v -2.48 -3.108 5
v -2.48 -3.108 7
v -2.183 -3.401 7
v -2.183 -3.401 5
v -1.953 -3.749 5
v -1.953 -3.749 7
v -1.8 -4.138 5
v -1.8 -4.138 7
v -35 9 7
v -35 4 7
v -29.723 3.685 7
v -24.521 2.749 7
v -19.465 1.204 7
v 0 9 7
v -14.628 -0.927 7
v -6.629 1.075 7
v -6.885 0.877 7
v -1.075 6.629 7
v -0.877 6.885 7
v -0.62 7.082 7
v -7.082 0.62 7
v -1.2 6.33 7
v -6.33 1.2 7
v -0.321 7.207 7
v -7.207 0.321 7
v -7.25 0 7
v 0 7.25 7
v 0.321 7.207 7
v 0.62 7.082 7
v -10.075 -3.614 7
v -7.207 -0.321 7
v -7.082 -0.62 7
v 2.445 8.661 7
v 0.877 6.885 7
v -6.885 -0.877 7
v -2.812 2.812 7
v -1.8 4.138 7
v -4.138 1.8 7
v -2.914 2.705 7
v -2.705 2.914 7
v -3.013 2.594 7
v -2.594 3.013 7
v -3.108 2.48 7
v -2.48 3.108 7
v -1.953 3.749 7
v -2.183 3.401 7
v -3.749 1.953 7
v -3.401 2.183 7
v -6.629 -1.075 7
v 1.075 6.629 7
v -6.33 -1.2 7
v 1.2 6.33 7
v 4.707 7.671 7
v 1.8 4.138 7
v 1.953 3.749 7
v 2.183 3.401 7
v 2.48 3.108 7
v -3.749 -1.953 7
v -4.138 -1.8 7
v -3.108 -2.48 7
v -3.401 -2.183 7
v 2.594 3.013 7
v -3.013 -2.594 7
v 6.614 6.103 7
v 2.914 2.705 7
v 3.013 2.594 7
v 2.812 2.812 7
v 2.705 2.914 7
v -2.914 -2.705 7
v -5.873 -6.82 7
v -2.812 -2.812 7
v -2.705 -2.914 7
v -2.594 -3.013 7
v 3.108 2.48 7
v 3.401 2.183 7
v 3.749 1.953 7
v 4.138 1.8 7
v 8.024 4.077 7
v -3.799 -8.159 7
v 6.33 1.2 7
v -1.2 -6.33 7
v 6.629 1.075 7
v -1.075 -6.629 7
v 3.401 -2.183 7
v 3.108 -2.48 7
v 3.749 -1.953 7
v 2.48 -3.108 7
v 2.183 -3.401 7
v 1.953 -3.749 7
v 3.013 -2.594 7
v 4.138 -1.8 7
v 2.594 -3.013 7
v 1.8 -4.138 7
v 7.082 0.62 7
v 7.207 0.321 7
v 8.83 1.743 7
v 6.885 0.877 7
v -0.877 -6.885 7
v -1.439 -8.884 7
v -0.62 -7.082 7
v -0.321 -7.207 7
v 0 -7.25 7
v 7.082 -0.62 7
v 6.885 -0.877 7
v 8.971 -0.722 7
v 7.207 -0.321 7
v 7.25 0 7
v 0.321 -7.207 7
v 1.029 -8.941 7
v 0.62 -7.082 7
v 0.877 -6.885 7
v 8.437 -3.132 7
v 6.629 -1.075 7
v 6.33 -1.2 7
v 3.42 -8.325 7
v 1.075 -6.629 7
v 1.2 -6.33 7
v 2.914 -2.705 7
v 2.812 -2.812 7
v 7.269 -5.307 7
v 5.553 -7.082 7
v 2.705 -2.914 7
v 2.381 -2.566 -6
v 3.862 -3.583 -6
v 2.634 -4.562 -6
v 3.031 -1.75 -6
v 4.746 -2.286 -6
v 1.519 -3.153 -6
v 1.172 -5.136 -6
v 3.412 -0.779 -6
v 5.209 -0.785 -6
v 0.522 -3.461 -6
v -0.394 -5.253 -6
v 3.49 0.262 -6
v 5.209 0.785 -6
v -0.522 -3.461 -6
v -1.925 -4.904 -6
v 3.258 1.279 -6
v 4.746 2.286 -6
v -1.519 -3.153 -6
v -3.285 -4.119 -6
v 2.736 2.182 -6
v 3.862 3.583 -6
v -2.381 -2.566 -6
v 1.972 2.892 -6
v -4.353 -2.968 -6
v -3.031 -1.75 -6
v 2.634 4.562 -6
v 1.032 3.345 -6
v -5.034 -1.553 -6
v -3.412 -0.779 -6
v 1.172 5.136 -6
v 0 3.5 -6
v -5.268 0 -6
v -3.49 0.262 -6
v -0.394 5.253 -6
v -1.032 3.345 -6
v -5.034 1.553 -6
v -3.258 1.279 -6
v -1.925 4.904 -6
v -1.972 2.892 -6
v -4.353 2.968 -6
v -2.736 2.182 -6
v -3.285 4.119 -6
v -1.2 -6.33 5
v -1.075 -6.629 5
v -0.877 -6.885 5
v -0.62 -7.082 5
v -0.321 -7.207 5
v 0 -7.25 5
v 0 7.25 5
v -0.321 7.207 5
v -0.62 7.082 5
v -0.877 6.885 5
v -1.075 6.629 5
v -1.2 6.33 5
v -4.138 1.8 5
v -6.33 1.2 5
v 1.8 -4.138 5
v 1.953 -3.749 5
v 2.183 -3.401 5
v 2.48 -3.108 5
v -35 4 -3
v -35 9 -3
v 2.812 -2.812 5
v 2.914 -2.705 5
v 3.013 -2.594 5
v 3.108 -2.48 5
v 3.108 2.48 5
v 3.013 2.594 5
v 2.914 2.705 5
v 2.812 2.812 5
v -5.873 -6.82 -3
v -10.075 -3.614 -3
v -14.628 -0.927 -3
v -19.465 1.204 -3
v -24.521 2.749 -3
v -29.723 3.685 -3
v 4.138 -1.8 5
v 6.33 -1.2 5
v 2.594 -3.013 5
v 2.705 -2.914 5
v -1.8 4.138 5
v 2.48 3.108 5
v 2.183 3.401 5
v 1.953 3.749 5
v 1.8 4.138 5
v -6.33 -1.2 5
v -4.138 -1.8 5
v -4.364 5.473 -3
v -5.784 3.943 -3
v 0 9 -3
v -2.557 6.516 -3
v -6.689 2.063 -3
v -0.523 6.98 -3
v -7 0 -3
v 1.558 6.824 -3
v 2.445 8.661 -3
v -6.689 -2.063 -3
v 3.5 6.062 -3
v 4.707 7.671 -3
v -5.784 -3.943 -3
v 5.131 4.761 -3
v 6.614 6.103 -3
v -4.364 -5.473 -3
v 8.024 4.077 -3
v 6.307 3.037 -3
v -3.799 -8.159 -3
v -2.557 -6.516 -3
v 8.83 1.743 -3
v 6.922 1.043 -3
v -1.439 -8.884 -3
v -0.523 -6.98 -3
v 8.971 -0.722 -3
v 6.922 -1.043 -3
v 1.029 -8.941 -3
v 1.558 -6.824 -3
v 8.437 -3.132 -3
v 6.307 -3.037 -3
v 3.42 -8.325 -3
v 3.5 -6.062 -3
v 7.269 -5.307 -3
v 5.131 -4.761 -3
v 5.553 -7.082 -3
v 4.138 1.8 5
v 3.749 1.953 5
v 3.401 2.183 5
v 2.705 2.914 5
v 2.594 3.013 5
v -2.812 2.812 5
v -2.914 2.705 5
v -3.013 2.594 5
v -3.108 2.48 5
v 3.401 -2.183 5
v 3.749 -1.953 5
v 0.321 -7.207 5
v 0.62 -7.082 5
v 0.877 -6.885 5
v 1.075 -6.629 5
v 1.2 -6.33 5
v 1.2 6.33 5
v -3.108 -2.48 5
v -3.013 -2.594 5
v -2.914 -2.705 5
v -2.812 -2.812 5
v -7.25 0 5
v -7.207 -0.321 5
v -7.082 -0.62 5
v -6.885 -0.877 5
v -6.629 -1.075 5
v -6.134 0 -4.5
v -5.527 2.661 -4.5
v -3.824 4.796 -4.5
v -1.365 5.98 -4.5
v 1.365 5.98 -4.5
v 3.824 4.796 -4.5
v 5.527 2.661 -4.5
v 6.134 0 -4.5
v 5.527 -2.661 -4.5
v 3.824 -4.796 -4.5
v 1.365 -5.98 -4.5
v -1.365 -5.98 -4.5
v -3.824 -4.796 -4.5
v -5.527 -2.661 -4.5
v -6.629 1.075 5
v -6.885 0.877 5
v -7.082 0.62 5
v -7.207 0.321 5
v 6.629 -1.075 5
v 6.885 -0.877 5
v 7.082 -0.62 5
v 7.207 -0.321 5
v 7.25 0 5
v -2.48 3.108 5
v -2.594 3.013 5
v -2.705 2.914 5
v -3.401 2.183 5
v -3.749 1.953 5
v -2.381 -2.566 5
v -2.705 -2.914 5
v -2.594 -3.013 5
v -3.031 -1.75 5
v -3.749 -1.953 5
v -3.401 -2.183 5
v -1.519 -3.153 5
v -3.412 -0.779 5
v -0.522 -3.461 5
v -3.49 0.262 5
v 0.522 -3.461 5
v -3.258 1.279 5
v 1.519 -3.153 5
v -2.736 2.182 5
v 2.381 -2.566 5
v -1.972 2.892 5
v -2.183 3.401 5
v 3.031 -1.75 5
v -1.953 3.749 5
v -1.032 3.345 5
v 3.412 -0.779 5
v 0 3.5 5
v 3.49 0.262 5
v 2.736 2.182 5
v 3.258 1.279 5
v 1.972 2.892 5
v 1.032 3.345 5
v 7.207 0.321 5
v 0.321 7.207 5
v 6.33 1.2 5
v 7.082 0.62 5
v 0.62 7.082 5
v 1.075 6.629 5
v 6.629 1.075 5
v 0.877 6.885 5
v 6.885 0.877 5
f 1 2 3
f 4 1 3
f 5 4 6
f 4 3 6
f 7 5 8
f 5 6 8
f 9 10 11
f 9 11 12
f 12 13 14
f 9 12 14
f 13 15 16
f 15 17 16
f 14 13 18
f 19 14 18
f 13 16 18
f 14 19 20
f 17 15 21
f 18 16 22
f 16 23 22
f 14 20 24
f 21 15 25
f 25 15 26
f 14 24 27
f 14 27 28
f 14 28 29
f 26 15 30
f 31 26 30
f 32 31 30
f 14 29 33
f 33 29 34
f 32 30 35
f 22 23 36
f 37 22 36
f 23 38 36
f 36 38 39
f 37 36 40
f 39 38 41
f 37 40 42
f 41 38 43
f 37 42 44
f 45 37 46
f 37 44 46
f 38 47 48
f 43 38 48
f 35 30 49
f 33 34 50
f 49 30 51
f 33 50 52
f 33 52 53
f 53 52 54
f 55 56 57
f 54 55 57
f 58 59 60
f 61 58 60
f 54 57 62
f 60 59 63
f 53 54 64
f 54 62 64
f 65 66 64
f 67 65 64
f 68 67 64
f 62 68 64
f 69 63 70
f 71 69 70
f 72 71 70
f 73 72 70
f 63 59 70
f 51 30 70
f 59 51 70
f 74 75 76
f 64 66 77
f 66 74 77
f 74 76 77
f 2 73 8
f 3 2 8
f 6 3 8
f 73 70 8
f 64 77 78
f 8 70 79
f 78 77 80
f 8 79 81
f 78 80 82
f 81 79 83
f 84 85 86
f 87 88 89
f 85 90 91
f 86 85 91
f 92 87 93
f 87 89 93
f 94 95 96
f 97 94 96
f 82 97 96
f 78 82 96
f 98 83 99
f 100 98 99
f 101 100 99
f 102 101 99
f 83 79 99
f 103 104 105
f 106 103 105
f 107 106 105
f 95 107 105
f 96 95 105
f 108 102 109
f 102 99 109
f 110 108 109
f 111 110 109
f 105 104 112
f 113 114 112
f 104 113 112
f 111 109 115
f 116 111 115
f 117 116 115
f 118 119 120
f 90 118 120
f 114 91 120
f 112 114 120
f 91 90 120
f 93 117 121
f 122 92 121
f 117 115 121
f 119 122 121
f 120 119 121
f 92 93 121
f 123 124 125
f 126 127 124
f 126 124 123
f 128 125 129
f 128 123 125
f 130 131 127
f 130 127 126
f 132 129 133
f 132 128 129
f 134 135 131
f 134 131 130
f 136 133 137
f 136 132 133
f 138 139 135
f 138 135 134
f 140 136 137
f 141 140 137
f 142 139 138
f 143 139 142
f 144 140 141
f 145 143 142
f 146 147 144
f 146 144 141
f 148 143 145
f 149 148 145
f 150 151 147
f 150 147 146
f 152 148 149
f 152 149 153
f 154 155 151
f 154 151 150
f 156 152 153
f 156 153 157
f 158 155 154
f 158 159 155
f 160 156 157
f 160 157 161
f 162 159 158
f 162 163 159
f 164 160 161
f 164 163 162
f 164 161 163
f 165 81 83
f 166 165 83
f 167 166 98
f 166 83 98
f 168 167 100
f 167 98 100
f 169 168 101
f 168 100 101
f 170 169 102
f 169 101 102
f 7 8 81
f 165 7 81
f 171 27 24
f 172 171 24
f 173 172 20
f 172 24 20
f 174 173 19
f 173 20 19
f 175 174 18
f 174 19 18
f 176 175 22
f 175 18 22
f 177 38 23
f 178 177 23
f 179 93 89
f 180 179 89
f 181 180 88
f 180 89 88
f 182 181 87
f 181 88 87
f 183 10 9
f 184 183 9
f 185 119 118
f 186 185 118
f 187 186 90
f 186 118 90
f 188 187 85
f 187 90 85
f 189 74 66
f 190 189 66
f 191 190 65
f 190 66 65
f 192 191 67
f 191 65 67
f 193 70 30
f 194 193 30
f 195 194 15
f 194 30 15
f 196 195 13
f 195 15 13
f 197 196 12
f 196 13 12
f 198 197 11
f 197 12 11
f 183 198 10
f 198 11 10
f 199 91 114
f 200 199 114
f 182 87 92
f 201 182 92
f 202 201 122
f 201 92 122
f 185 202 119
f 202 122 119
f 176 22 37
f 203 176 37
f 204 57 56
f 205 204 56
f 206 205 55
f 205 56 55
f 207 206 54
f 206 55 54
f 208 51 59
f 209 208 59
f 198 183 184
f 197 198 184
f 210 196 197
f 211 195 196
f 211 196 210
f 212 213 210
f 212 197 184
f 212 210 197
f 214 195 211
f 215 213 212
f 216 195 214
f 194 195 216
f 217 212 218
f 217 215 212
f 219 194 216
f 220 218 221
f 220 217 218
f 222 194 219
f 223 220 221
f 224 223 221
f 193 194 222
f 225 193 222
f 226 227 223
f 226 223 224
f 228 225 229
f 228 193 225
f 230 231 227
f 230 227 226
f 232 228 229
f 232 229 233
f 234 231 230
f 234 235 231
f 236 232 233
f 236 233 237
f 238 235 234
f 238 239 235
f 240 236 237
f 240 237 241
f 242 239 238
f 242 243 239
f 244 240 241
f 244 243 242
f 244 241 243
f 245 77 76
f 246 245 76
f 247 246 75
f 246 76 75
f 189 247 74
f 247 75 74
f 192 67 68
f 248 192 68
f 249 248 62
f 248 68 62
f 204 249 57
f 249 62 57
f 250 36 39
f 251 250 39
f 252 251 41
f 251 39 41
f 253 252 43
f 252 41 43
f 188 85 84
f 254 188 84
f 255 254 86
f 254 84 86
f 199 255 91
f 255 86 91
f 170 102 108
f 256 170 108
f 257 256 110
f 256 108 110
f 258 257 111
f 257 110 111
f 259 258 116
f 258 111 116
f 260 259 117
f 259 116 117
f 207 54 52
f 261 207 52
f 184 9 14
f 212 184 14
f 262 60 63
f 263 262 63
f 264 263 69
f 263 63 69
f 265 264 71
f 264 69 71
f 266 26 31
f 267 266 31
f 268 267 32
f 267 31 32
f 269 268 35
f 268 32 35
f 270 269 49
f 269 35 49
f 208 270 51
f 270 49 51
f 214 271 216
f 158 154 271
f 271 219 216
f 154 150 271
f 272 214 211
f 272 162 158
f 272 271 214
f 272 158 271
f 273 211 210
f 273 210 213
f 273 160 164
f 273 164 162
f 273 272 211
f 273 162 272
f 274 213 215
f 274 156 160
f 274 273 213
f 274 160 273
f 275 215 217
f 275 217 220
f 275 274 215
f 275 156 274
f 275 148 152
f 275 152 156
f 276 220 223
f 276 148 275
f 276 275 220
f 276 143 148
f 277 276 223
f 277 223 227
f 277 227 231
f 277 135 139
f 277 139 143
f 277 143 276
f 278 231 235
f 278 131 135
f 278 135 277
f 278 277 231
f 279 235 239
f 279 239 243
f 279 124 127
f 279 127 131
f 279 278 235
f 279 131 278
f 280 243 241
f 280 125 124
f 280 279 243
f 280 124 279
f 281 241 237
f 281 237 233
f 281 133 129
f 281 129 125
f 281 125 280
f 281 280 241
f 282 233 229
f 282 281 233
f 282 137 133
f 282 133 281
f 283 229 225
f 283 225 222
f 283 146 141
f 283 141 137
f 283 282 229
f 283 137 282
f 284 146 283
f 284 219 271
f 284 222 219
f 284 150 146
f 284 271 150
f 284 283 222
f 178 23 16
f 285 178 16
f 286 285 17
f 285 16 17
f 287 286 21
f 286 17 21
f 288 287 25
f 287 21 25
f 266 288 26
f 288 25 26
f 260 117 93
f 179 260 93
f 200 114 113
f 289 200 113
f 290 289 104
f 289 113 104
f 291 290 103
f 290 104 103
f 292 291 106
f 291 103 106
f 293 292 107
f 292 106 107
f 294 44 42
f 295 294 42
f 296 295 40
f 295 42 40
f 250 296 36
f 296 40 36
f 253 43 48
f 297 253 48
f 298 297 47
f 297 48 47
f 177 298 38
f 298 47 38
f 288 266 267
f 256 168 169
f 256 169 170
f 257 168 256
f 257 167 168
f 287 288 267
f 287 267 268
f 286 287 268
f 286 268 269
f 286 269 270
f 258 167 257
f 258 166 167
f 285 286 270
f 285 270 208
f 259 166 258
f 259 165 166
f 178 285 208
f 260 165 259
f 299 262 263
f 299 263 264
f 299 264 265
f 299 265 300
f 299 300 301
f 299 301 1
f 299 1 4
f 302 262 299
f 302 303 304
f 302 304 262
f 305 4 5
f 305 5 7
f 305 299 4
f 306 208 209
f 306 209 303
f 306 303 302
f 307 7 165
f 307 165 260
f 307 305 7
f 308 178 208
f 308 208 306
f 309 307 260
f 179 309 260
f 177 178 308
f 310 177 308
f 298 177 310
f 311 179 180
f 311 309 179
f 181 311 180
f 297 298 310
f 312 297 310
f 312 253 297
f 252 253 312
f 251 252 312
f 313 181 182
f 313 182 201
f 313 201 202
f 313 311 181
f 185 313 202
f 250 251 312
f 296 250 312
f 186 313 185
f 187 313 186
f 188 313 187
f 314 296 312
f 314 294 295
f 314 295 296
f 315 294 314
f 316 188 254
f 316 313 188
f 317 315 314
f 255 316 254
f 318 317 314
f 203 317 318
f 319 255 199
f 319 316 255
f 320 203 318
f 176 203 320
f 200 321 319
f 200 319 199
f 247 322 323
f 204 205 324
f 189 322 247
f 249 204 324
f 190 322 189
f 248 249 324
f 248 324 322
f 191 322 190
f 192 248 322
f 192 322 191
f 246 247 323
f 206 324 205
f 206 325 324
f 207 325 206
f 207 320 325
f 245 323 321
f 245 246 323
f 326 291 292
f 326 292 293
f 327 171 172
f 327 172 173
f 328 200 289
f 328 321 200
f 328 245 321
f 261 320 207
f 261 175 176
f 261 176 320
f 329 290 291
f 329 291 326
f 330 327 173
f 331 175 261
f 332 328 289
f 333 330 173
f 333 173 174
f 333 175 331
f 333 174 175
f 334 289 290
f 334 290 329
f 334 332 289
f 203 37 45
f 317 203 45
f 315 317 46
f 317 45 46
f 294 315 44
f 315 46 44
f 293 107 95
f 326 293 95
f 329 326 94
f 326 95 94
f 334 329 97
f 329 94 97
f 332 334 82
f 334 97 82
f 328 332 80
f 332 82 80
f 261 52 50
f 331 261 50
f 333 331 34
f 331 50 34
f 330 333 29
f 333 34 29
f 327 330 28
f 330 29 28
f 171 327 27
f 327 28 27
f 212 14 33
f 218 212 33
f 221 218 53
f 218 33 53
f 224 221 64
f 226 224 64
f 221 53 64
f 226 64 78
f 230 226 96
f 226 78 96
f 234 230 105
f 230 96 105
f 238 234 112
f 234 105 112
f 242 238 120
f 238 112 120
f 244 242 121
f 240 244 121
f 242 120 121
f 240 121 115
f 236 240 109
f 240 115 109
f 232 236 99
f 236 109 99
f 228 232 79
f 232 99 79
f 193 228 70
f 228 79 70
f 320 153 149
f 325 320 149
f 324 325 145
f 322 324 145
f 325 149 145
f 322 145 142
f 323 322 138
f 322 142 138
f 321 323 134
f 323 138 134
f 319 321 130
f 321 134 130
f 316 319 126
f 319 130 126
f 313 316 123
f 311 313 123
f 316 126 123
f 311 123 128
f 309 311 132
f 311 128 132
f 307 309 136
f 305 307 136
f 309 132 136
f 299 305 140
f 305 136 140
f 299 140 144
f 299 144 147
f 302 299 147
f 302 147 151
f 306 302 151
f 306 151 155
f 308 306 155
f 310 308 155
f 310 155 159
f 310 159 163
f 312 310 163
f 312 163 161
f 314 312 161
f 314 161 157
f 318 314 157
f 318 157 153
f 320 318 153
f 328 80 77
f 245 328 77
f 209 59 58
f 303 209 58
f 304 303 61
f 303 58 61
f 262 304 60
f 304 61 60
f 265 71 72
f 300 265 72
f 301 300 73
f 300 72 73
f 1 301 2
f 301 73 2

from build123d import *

# Parameters (mm, degrees)
SKETCH1_R             = 9
BOSS_EXTRUDE1_DEPTH   = 10
BODY_MOVE_COPY1_ANGLE = 180
CUT_EXTRUDE5_DEPTH    = 2
SKETCH19_R            = 7
BOSS_EXTRUDE12_DEPTH  = 3
BOSS_EXTRUDE12_TAPER  = 30
SKETCH20_R            = 3.5
CUT_EXTRUDE6_DEPTH    = 39.405728739


with BuildPart() as part:
    # Sketch1 → Boss-Extrude1 (new body)
    with BuildSketch(Plane.XY):
        Circle(SKETCH1_R)
        with BuildLine():
            Line((-35, -9), (0, -9))
            ThreePointArc((0, -9), (-8.437416666, -3.132091953), (-5.872614409, 6.82))
            ThreePointArc((-5.872614409, 6.82), (-19.465199243, -1.204217751), (-35, -4))
            Line((-35, -4), (-35, -9))
        make_face()
    extrude(amount=BOSS_EXTRUDE1_DEPTH)


with BuildPart() as part_1:
    # Body-Move/Copy1: moved
    add(part.part.rotate(Axis((0, 0, 3.5), (1, 0, 0)), BODY_MOVE_COPY1_ANGLE))

    # Sketch18 → Cut-Extrude5 (cut)
    with BuildSketch(Plane.XY.offset(7)):
        with BuildLine():
            Line((1.2, -6.33), (1.8, -4.1378116))
            ThreePointArc((1.8, -4.1378116), (2.058560194, -3.569045514), (2.48, -3.1078116))
            ThreePointArc((2.48, -3.1078116), (2.64989874, -2.964295475), (2.811558399, -2.811558399))
            ThreePointArc((2.811558399, -2.811558399), (2.964295475, -2.64989874), (3.1078116, -2.48))
            ThreePointArc((3.1078116, -2.48), (3.569045514, -2.058560194), (4.1378116, -1.8))
            Line((4.1378116, -1.8), (6.33, -1.2))
            ThreePointArc((6.33, -1.2), (6.992020752, -0.754882576), (7.25, 0))
            ThreePointArc((7.25, 0), (6.992020752, 0.754882576), (6.33, 1.2))
            Line((6.33, 1.2), (4.1378116, 1.8))
            ThreePointArc((4.1378116, 1.8), (3.569045514, 2.058560194), (3.1078116, 2.48))
            ThreePointArc((3.1078116, 2.48), (2.964295475, 2.64989874), (2.811558399, 2.811558399))
            ThreePointArc((2.811558399, 2.811558399), (2.64989874, 2.964295475), (2.48, 3.1078116))
            ThreePointArc((2.48, 3.1078116), (2.058560194, 3.569045514), (1.8, 4.1378116))
            Line((1.8, 4.1378116), (1.2, 6.33))
            ThreePointArc((1.2, 6.33), (0.754882576, 6.992020752), (0, 7.25))
            ThreePointArc((0, 7.25), (-0.754882576, 6.992020752), (-1.2, 6.33))
            Line((-1.2, 6.33), (-1.8, 4.1378116))
            ThreePointArc((-1.8, 4.1378116), (-2.058560194, 3.569045514), (-2.48, 3.1078116))
            ThreePointArc((-2.48, 3.1078116), (-2.64989874, 2.964295475), (-2.811558399, 2.811558399))
            ThreePointArc((-2.811558399, 2.811558399), (-2.964295475, 2.64989874), (-3.1078116, 2.48))
            ThreePointArc((-3.1078116, 2.48), (-3.569045514, 2.058560194), (-4.1378116, 1.8))
            Line((-4.1378116, 1.8), (-6.33, 1.2))
            ThreePointArc((-6.33, 1.2), (-6.992020752, 0.754882576), (-7.25, 0))
            ThreePointArc((-7.25, 0), (-6.992020752, -0.754882576), (-6.33, -1.2))
            Line((-6.33, -1.2), (-4.1378116, -1.8))
            ThreePointArc((-4.1378116, -1.8), (-3.569045514, -2.058560194), (-3.1078116, -2.48))
            ThreePointArc((-3.1078116, -2.48), (-2.964295475, -2.64989874), (-2.811558399, -2.811558399))
            ThreePointArc((-2.811558399, -2.811558399), (-2.64989874, -2.964295475), (-2.48, -3.1078116))
            ThreePointArc((-2.48, -3.1078116), (-2.058560194, -3.569045514), (-1.8, -4.1378116))
            Line((-1.8, -4.1378116), (-1.2, -6.33))
            ThreePointArc((-1.2, -6.33), (-0.754882576, -6.992020752), (0, -7.25))
            ThreePointArc((0, -7.25), (0.754882576, -6.992020752), (1.2, -6.33))
        make_face()
    extrude(amount=-CUT_EXTRUDE5_DEPTH, mode=Mode.SUBTRACT)

    # Sketch19 → Boss-Extrude12 (add)
    with BuildSketch(Plane(origin=(0, 0, -3), x_dir=(-1, 0, 0), z_dir=(0, 0, -1))):
        Circle(SKETCH19_R)
    extrude(amount=BOSS_EXTRUDE12_DEPTH, taper=BOSS_EXTRUDE12_TAPER)

    # Sketch20 → Cut-Extrude6 (cut, through all)
    with BuildSketch(Plane(origin=(0, 0, -6), x_dir=(-1, 0, 0), z_dir=(0, 0, -1))):
        with Locations(Location((0, 0, 0), (0, 0, 90))):
            Circle(SKETCH20_R)
    extrude(amount=-CUT_EXTRUDE6_DEPTH, mode=Mode.SUBTRACT)


solid = part_1.part
